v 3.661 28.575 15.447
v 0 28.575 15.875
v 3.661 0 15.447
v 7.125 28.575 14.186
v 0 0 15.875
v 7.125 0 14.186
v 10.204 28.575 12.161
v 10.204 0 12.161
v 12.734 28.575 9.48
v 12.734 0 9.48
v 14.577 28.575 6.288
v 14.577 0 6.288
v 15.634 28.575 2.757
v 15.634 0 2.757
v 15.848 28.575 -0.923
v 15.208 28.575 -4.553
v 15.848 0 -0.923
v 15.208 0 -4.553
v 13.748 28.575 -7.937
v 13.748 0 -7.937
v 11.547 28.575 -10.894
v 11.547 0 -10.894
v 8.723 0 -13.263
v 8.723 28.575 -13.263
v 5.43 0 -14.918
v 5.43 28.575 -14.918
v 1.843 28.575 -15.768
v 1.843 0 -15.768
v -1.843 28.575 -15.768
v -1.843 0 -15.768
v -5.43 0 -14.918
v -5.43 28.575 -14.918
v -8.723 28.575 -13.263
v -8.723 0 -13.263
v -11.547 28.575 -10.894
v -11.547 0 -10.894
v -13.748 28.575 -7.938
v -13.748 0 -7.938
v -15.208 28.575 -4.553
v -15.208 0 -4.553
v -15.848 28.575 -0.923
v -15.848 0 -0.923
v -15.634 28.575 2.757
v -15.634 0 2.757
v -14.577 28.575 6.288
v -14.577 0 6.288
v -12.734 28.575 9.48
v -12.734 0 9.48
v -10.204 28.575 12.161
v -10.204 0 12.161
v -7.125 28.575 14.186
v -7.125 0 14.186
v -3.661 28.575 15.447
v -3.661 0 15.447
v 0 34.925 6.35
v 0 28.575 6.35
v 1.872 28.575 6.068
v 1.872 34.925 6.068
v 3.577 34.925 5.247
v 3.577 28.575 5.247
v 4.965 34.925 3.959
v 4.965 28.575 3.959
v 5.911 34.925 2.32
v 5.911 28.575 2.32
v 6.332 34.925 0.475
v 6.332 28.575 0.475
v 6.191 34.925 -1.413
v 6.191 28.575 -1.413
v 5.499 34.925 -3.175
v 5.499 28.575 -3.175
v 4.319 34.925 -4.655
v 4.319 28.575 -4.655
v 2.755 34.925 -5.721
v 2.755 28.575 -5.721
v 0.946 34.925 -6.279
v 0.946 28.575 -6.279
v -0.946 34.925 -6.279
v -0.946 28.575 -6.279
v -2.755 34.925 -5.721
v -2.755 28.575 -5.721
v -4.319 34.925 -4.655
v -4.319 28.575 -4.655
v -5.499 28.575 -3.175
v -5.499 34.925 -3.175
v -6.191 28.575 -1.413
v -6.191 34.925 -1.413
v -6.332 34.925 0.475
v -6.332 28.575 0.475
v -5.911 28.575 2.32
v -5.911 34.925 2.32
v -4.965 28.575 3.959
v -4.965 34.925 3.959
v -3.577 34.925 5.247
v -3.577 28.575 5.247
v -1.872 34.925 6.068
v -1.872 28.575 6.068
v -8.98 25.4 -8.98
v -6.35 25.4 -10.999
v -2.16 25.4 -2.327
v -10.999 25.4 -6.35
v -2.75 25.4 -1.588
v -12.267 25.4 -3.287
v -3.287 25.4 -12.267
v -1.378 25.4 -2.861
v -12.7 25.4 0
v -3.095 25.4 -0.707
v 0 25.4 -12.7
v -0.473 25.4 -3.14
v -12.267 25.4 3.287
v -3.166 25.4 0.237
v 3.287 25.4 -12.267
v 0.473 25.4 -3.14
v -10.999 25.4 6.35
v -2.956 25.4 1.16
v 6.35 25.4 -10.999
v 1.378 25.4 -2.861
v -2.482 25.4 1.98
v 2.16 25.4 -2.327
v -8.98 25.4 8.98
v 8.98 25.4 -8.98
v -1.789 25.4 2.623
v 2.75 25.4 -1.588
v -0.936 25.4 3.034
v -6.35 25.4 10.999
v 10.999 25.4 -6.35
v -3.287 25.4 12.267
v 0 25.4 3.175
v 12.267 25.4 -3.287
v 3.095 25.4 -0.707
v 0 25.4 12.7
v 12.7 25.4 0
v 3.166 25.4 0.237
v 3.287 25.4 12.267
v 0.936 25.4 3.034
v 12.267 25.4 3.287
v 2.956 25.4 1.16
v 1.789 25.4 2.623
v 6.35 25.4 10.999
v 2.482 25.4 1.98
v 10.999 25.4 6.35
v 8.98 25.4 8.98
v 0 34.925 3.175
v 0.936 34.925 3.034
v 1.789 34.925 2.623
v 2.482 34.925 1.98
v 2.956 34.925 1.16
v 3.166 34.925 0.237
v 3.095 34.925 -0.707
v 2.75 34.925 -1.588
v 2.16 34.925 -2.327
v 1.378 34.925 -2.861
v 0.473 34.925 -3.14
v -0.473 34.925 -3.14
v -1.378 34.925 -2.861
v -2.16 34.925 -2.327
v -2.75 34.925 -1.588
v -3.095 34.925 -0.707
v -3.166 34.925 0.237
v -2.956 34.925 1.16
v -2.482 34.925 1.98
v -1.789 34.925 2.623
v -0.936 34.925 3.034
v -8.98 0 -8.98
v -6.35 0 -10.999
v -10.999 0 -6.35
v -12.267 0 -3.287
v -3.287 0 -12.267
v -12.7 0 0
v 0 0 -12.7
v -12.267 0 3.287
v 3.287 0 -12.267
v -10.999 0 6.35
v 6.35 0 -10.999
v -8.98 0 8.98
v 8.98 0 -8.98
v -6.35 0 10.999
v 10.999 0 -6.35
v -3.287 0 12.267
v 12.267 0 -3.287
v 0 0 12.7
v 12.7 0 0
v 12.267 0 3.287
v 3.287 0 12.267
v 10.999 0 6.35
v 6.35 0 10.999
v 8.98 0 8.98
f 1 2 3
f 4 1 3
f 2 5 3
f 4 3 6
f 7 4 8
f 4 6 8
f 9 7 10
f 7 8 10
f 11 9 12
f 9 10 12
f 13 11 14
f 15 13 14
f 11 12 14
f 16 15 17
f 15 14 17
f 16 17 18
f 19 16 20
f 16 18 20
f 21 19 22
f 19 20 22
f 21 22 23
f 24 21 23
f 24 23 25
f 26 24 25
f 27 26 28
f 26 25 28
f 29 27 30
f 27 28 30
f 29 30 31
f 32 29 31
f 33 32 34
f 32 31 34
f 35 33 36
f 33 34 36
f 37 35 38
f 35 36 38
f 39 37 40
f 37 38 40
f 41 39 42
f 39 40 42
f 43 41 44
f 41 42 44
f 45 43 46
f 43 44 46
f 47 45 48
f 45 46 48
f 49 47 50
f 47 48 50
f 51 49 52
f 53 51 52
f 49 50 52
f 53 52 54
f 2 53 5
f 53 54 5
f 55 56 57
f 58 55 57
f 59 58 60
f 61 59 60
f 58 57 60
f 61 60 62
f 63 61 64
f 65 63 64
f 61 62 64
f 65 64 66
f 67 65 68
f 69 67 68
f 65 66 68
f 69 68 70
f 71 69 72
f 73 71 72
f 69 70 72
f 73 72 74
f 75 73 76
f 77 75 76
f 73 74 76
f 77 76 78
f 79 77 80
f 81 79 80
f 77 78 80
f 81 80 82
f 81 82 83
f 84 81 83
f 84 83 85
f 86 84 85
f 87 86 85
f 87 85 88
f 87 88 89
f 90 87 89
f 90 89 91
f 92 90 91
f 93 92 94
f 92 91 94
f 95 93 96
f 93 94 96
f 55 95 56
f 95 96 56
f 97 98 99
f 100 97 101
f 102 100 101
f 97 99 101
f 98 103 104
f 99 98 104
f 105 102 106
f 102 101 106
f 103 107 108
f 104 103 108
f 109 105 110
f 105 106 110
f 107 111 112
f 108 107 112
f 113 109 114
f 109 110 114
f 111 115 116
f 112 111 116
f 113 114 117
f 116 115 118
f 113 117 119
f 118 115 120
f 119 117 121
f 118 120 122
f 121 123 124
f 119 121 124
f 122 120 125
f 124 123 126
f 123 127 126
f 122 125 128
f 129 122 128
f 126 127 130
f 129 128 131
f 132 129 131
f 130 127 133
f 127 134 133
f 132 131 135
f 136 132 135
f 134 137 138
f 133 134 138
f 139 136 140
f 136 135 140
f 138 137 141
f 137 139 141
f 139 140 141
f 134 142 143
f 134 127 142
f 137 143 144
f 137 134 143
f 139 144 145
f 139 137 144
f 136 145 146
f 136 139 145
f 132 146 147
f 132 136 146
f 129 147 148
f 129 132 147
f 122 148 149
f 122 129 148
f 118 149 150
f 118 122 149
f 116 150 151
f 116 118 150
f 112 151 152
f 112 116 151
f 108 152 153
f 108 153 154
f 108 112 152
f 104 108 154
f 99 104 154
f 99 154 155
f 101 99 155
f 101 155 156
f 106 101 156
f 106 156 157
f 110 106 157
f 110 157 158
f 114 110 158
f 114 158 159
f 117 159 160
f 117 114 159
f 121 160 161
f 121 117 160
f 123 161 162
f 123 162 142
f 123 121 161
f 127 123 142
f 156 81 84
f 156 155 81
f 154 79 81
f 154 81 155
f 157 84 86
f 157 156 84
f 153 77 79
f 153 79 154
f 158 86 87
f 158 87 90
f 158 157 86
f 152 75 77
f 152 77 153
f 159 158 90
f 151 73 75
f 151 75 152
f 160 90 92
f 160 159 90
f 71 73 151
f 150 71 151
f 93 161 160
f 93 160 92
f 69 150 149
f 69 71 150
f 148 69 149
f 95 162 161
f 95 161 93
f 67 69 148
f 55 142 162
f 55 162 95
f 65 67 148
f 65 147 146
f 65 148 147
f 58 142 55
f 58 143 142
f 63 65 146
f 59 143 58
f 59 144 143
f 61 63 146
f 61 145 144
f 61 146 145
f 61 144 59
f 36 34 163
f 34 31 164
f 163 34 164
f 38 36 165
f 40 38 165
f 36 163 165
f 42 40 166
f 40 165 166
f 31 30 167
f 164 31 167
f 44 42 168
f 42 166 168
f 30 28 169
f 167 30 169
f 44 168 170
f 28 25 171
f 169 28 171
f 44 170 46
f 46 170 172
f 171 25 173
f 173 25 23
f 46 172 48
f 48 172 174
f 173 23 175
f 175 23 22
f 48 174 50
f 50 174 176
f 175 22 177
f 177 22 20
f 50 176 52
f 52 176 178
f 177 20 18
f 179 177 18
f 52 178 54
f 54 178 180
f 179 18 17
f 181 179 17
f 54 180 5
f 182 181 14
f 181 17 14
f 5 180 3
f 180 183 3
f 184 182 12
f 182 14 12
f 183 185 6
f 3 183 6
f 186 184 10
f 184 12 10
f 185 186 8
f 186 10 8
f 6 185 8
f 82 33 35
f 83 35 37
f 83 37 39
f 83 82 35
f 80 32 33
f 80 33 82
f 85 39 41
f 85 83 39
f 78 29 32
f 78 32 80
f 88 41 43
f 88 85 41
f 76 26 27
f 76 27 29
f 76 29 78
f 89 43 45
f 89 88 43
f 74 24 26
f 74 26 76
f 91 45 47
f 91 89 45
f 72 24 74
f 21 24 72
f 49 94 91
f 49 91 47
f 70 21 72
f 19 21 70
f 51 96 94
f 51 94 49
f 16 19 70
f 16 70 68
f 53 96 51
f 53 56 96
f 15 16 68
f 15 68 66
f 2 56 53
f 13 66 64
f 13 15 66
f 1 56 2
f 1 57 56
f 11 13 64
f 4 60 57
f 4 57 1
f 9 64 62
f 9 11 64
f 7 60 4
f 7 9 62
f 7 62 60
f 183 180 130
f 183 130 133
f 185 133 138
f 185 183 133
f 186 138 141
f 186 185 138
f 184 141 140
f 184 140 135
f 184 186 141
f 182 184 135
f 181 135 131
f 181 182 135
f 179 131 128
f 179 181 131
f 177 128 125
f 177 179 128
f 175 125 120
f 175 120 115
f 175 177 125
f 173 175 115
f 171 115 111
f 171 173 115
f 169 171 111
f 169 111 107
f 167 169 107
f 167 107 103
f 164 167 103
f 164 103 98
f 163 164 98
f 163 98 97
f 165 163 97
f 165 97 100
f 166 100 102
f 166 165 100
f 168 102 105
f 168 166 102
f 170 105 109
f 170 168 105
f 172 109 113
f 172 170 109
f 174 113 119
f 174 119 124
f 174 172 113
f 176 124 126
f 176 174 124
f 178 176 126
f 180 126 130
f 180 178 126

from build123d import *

# Parameters (mm, degrees)
SKETCH1_R           = 15.875
SKETCH1_R_2         = 12.7
BOSS_EXTRUDE1_DEPTH = 25.4
SKETCH2_R           = 15.875
SKETCH2_R_2         = 3.175
BOSS_EXTRUDE2_DEPTH = 3.175
SKETCH3_R           = 6.35
SKETCH3_R_2         = 3.175
BOSS_EXTRUDE3_DEPTH = 6.35


with BuildPart() as part:
    # Sketch1 → Boss-Extrude1 (new body)
    with BuildSketch(Plane(origin=(0, 0, 0), x_dir=(1, 0, 0), z_dir=(0, 1, 0))):
        with Locations(Location((0, 0, 0), (0, 0, 270))):
            Circle(SKETCH1_R)
        with Locations(Location((0, 0, 0), (0, 0, 270))):
            Circle(SKETCH1_R_2, mode=Mode.SUBTRACT)
    extrude(amount=BOSS_EXTRUDE1_DEPTH)

    # Sketch2 → Boss-Extrude2 (add)
    with BuildSketch(Plane(origin=(0, 25.4, 0), x_dir=(1, 0, 0), z_dir=(0, 1, 0))):
        with Locations(Location((0, 0, 0), (0, 0, 270))):
            Circle(SKETCH2_R)
        with Locations(Location((0, 0, 0), (0, 0, 270))):
            Circle(SKETCH2_R_2, mode=Mode.SUBTRACT)
    extrude(amount=BOSS_EXTRUDE2_DEPTH)

    # Sketch3 → Boss-Extrude3 (add)
    with BuildSketch(Plane(origin=(0, 28.575, 0), x_dir=(1, 0, 0), z_dir=(0, 1, 0))):
        with Locations(Location((0, 0, 0), (0, 0, 270))):
            Circle(SKETCH3_R)
        with Locations(Location((0, 0, 0), (0, 0, 270))):
            Circle(SKETCH3_R_2, mode=Mode.SUBTRACT)
    extrude(amount=BOSS_EXTRUDE3_DEPTH)


solid = part.part
